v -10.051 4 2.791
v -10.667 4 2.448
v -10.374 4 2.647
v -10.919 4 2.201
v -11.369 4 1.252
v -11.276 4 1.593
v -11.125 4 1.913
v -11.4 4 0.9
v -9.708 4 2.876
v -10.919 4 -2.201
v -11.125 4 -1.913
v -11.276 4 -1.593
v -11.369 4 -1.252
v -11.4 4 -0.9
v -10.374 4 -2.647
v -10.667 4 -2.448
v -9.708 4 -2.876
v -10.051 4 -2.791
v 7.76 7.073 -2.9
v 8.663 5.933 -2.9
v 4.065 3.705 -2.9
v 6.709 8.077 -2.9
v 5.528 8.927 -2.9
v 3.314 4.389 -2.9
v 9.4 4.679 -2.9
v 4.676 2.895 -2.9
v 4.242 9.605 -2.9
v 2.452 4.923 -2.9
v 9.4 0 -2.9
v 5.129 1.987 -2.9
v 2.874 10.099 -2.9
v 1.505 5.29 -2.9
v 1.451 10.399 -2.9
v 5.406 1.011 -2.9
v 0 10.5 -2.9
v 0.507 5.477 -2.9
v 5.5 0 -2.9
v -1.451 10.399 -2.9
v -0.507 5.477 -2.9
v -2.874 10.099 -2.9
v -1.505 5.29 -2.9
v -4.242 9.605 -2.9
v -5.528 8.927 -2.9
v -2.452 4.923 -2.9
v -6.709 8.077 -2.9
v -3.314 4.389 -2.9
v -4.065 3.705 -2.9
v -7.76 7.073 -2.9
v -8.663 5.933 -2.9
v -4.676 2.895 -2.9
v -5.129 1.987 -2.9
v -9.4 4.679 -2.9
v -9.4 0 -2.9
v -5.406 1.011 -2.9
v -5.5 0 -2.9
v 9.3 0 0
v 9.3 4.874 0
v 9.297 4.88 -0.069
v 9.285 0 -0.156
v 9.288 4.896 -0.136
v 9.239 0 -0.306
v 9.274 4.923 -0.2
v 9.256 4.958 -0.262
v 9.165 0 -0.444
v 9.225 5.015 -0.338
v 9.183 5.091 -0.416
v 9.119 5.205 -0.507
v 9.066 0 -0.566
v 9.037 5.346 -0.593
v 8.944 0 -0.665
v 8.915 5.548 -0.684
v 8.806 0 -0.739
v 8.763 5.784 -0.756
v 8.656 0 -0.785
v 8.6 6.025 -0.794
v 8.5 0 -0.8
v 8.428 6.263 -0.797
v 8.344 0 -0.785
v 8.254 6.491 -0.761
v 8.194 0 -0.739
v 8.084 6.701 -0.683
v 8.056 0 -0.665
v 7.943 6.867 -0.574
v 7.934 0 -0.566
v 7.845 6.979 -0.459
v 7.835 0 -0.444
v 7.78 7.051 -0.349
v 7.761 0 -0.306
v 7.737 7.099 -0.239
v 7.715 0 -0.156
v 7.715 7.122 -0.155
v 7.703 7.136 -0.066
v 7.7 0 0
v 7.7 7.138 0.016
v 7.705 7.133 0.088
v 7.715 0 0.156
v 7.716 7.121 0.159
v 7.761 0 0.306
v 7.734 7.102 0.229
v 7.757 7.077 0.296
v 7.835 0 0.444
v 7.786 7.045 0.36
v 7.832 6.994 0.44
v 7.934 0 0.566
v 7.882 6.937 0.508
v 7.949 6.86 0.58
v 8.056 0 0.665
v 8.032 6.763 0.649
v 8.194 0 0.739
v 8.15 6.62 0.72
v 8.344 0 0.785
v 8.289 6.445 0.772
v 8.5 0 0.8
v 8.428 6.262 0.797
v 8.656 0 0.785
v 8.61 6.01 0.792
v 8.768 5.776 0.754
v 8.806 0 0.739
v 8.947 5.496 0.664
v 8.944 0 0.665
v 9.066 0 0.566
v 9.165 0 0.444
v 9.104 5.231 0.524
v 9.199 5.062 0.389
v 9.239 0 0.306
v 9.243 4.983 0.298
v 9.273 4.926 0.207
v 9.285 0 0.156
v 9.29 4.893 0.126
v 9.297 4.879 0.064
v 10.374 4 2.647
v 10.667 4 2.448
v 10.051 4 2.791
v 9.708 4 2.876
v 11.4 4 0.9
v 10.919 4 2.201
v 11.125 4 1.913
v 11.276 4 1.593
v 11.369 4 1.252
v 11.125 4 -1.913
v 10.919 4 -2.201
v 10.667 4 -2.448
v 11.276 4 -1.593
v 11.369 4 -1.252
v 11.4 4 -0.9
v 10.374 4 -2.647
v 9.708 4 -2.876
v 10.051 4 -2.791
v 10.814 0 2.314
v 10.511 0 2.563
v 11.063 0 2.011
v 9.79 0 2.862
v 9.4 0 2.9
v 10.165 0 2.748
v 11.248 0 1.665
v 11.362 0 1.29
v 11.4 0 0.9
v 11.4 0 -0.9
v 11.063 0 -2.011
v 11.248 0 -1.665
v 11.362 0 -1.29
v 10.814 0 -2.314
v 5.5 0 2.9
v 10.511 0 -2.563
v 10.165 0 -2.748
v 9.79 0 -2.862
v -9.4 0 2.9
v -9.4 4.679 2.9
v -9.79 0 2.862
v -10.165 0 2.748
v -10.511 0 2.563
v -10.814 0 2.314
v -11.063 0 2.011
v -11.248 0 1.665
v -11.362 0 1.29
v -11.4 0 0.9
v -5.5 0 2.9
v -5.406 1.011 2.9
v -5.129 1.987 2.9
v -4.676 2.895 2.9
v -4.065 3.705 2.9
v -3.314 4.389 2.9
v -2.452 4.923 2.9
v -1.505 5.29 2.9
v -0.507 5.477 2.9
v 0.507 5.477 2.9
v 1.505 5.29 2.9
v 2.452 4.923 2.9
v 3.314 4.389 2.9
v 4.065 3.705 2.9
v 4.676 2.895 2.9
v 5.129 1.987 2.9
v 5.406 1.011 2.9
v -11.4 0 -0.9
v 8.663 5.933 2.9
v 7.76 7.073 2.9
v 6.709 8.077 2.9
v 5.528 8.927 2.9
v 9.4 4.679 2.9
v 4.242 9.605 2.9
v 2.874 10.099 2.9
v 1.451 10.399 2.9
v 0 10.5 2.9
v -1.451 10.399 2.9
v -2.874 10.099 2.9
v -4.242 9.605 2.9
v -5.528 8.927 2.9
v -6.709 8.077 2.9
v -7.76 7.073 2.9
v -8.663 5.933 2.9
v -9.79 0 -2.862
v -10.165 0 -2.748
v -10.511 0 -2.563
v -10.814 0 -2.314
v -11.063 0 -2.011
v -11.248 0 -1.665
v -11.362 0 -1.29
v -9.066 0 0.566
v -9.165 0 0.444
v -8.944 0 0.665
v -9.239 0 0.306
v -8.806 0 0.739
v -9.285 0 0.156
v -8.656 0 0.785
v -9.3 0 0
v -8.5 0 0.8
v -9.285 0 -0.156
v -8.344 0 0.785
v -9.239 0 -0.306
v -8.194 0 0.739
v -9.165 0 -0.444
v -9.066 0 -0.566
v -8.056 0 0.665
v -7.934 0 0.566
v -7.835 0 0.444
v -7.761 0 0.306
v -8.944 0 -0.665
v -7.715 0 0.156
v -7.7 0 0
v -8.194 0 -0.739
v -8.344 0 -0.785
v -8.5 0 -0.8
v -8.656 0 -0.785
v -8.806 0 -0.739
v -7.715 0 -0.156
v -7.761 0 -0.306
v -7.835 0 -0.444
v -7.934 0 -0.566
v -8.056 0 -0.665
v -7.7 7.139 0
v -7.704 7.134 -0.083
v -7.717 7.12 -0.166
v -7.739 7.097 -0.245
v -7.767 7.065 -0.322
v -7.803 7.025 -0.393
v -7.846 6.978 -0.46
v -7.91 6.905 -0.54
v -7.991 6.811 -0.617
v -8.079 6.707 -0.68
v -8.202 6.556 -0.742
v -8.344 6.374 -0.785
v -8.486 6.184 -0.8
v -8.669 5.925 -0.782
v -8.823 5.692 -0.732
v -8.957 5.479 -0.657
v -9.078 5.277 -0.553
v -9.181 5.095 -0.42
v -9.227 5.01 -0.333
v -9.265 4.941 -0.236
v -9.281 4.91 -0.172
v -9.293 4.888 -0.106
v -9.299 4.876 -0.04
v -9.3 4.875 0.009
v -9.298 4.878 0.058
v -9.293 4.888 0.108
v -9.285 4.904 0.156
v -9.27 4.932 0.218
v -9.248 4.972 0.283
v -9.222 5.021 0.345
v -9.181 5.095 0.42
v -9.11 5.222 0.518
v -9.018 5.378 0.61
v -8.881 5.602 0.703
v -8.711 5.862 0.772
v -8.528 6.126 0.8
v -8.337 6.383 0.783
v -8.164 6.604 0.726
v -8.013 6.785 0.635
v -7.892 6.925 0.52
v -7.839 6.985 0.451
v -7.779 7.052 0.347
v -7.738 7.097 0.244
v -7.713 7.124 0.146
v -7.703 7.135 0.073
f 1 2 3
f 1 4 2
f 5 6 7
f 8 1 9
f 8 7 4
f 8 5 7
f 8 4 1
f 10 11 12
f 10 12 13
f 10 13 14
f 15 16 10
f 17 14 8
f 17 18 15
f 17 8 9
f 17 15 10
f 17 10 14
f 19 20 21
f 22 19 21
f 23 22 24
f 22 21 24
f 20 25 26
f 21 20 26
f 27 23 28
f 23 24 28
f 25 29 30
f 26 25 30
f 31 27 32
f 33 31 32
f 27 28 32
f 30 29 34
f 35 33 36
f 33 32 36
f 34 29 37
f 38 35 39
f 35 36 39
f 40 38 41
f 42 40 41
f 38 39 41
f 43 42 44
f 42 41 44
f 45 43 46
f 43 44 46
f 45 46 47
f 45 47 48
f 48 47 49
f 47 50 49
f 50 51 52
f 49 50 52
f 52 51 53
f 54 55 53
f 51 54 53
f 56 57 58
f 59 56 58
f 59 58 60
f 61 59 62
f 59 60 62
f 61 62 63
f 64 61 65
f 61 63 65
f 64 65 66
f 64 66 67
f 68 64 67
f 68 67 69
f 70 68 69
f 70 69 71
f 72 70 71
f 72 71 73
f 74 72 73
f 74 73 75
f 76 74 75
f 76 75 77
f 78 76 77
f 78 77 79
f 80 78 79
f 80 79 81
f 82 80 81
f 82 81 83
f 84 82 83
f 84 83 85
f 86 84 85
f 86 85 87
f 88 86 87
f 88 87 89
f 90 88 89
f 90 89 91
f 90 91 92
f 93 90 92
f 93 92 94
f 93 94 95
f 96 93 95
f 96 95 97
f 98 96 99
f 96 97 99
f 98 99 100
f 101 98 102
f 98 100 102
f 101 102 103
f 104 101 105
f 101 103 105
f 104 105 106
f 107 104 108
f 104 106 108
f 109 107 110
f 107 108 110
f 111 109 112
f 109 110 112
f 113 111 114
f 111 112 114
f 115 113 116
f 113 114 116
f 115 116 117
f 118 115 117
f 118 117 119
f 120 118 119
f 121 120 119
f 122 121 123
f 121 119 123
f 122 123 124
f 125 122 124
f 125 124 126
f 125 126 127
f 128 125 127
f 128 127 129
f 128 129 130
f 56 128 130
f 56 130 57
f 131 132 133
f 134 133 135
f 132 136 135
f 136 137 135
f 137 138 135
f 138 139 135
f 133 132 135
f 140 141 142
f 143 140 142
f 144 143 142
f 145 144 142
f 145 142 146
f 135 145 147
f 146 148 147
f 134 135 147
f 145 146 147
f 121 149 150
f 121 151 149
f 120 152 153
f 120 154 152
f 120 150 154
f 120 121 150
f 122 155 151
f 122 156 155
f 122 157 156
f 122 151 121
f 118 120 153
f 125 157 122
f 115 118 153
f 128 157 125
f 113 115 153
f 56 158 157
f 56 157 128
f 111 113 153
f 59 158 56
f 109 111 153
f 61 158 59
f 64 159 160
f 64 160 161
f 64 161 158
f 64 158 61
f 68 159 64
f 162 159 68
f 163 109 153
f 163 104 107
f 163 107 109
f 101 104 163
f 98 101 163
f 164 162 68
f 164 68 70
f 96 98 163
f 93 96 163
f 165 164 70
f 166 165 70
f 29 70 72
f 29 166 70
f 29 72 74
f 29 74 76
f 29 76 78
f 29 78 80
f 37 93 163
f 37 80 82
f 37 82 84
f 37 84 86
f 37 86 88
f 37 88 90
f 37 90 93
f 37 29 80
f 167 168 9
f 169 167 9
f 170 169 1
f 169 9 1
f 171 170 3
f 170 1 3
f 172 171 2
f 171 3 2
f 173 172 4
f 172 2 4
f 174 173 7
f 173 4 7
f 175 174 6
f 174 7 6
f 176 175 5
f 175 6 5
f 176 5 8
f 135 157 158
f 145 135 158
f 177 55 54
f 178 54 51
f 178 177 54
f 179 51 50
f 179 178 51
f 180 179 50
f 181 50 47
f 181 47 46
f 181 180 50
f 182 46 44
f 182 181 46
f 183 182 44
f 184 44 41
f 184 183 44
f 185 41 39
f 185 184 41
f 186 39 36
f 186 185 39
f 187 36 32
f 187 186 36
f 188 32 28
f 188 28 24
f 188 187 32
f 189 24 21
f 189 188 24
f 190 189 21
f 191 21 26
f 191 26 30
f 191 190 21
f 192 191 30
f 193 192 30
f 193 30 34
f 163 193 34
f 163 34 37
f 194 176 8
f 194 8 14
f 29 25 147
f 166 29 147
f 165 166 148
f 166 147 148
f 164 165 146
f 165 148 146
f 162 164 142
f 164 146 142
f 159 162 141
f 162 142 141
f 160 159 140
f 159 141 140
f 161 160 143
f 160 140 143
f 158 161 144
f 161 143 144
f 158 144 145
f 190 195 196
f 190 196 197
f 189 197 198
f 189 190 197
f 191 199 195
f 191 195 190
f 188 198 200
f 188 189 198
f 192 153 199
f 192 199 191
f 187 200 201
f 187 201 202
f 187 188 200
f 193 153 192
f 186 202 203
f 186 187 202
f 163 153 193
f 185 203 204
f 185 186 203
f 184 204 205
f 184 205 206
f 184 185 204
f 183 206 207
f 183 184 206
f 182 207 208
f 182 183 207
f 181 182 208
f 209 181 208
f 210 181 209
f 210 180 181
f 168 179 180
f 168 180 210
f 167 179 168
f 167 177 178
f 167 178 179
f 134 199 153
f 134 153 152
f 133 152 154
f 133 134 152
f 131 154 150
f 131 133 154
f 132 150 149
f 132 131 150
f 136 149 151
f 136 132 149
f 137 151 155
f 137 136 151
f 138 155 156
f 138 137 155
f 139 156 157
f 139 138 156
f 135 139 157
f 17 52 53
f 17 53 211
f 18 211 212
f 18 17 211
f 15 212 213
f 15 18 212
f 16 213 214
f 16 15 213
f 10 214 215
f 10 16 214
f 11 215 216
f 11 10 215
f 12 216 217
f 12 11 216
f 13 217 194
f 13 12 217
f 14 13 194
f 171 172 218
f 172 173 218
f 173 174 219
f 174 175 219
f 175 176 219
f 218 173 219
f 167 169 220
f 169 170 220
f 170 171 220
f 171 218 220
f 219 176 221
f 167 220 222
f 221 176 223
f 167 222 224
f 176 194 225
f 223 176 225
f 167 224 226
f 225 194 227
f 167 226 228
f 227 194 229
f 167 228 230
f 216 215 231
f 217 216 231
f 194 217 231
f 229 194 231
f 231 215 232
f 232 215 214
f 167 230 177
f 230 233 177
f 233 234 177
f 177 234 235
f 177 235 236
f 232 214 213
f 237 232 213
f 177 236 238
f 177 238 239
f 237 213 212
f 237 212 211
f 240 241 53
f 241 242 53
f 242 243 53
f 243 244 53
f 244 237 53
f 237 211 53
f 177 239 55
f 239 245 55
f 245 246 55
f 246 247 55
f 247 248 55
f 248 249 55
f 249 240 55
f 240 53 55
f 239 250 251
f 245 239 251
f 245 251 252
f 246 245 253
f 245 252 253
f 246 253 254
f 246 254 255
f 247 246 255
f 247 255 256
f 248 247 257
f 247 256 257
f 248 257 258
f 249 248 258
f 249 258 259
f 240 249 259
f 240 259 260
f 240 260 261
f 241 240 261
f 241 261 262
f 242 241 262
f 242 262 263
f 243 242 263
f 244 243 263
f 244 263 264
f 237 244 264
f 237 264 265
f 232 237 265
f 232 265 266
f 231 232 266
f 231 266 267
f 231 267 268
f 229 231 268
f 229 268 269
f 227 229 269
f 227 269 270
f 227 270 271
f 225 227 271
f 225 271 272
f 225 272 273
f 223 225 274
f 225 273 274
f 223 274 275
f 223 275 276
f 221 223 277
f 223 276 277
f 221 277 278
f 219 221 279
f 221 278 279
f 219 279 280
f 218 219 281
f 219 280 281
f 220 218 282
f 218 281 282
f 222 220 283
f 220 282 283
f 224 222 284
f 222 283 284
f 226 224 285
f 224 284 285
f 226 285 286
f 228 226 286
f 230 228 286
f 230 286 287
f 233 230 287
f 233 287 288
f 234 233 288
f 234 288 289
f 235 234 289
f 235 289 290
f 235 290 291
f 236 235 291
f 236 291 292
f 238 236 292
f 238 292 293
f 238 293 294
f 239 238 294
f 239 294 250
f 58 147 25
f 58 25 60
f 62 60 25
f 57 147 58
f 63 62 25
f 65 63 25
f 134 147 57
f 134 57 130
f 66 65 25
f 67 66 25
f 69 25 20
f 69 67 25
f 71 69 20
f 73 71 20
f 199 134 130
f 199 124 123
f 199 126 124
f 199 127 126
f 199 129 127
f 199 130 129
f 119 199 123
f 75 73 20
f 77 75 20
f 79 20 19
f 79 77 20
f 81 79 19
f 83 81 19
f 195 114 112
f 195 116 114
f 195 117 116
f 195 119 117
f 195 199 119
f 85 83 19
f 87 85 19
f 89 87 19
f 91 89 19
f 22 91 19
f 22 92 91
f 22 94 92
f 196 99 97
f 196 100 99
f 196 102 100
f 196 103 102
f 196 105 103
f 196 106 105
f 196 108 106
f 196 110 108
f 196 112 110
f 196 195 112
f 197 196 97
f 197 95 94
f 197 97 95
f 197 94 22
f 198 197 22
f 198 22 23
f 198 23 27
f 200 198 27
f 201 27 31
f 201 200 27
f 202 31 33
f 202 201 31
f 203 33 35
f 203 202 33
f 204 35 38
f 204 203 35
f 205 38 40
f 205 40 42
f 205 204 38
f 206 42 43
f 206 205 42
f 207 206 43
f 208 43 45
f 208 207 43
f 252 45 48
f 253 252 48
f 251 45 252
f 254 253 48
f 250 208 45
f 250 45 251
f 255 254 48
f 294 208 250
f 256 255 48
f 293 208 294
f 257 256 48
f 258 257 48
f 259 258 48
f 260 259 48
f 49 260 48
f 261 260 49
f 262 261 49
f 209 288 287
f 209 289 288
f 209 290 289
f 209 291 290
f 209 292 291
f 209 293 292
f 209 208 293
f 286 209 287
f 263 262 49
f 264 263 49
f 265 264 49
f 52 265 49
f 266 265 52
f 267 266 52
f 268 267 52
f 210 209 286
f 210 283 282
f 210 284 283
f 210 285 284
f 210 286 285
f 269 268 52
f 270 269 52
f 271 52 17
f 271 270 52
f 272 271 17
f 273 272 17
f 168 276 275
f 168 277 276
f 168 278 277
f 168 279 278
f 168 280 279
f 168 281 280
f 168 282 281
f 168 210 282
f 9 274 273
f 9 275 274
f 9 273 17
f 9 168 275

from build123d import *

# Parameters (mm, degrees)
SKETCH1_W             = 5.9
SKETCH1_H             = 5.8
BOSS_EXTRUDE1_DEPTH   = 4
BOSS_EXTRUDE2_DEPTH   = 5.8
FILLET1_R             = 2
M2X0_4_TAPPED_HOLE1_D = 1.6


with BuildPart() as part:
    # Sketch1 → Boss-Extrude1 (new body)
    with BuildSketch(Plane(origin=(0, 0, 0), x_dir=(1, 0, 0), z_dir=(0, 1, 0))):
        with Locations((-8.45, 0)):
            Rectangle(SKETCH1_W, SKETCH1_H)
    extrude(amount=BOSS_EXTRUDE1_DEPTH)

    # Sketch2 → Boss-Extrude2 (add)
    with BuildSketch(Plane.XY.offset(2.9)):
        with BuildLine():
            Line((-10.5, 0), (-5.5, 0))
            ThreePointArc((-5.5, 0), (0, 5.5), (5.5, 0))
            Line((5.5, 0), (10.5, 0))
            ThreePointArc((10.5, 0), (0, 10.5), (-10.5, 0))
        make_face()
    extrude(amount=-BOSS_EXTRUDE2_DEPTH)


with BuildPart() as body_2:
    # Mirror3: mirrored copy
    add(part.part.mirror(Plane(origin=(0, 0, 0), x_dir=(0, 0, 1), z_dir=(1, 0, 0))))


with BuildPart() as part_1:
    add(part.part)

    # Combine1: union body 2
    add(body_2.part)

    # Fillet1
    fillet1_edges = [part_1.edges().sort_by_distance(p)[0] for p in [
        (-11.4, 2, -2.9),
        (-11.4, 2, 2.9),
        (11.4, 2, -2.9),
        (11.4, 2, 2.9),
    ]]
    fillet(fillet1_edges, radius=FILLET1_R)

    # M2x0.4 Tapped Hole1 (through all)
    with Locations(Plane(origin=(0, 0, 0), x_dir=(-1, 0, 0), z_dir=(0, -1, 0))):
        with Locations((-8.5, 0), (8.5, 0)):
            Hole(M2X0_4_TAPPED_HOLE1_D / 2)


solid = part_1.part
